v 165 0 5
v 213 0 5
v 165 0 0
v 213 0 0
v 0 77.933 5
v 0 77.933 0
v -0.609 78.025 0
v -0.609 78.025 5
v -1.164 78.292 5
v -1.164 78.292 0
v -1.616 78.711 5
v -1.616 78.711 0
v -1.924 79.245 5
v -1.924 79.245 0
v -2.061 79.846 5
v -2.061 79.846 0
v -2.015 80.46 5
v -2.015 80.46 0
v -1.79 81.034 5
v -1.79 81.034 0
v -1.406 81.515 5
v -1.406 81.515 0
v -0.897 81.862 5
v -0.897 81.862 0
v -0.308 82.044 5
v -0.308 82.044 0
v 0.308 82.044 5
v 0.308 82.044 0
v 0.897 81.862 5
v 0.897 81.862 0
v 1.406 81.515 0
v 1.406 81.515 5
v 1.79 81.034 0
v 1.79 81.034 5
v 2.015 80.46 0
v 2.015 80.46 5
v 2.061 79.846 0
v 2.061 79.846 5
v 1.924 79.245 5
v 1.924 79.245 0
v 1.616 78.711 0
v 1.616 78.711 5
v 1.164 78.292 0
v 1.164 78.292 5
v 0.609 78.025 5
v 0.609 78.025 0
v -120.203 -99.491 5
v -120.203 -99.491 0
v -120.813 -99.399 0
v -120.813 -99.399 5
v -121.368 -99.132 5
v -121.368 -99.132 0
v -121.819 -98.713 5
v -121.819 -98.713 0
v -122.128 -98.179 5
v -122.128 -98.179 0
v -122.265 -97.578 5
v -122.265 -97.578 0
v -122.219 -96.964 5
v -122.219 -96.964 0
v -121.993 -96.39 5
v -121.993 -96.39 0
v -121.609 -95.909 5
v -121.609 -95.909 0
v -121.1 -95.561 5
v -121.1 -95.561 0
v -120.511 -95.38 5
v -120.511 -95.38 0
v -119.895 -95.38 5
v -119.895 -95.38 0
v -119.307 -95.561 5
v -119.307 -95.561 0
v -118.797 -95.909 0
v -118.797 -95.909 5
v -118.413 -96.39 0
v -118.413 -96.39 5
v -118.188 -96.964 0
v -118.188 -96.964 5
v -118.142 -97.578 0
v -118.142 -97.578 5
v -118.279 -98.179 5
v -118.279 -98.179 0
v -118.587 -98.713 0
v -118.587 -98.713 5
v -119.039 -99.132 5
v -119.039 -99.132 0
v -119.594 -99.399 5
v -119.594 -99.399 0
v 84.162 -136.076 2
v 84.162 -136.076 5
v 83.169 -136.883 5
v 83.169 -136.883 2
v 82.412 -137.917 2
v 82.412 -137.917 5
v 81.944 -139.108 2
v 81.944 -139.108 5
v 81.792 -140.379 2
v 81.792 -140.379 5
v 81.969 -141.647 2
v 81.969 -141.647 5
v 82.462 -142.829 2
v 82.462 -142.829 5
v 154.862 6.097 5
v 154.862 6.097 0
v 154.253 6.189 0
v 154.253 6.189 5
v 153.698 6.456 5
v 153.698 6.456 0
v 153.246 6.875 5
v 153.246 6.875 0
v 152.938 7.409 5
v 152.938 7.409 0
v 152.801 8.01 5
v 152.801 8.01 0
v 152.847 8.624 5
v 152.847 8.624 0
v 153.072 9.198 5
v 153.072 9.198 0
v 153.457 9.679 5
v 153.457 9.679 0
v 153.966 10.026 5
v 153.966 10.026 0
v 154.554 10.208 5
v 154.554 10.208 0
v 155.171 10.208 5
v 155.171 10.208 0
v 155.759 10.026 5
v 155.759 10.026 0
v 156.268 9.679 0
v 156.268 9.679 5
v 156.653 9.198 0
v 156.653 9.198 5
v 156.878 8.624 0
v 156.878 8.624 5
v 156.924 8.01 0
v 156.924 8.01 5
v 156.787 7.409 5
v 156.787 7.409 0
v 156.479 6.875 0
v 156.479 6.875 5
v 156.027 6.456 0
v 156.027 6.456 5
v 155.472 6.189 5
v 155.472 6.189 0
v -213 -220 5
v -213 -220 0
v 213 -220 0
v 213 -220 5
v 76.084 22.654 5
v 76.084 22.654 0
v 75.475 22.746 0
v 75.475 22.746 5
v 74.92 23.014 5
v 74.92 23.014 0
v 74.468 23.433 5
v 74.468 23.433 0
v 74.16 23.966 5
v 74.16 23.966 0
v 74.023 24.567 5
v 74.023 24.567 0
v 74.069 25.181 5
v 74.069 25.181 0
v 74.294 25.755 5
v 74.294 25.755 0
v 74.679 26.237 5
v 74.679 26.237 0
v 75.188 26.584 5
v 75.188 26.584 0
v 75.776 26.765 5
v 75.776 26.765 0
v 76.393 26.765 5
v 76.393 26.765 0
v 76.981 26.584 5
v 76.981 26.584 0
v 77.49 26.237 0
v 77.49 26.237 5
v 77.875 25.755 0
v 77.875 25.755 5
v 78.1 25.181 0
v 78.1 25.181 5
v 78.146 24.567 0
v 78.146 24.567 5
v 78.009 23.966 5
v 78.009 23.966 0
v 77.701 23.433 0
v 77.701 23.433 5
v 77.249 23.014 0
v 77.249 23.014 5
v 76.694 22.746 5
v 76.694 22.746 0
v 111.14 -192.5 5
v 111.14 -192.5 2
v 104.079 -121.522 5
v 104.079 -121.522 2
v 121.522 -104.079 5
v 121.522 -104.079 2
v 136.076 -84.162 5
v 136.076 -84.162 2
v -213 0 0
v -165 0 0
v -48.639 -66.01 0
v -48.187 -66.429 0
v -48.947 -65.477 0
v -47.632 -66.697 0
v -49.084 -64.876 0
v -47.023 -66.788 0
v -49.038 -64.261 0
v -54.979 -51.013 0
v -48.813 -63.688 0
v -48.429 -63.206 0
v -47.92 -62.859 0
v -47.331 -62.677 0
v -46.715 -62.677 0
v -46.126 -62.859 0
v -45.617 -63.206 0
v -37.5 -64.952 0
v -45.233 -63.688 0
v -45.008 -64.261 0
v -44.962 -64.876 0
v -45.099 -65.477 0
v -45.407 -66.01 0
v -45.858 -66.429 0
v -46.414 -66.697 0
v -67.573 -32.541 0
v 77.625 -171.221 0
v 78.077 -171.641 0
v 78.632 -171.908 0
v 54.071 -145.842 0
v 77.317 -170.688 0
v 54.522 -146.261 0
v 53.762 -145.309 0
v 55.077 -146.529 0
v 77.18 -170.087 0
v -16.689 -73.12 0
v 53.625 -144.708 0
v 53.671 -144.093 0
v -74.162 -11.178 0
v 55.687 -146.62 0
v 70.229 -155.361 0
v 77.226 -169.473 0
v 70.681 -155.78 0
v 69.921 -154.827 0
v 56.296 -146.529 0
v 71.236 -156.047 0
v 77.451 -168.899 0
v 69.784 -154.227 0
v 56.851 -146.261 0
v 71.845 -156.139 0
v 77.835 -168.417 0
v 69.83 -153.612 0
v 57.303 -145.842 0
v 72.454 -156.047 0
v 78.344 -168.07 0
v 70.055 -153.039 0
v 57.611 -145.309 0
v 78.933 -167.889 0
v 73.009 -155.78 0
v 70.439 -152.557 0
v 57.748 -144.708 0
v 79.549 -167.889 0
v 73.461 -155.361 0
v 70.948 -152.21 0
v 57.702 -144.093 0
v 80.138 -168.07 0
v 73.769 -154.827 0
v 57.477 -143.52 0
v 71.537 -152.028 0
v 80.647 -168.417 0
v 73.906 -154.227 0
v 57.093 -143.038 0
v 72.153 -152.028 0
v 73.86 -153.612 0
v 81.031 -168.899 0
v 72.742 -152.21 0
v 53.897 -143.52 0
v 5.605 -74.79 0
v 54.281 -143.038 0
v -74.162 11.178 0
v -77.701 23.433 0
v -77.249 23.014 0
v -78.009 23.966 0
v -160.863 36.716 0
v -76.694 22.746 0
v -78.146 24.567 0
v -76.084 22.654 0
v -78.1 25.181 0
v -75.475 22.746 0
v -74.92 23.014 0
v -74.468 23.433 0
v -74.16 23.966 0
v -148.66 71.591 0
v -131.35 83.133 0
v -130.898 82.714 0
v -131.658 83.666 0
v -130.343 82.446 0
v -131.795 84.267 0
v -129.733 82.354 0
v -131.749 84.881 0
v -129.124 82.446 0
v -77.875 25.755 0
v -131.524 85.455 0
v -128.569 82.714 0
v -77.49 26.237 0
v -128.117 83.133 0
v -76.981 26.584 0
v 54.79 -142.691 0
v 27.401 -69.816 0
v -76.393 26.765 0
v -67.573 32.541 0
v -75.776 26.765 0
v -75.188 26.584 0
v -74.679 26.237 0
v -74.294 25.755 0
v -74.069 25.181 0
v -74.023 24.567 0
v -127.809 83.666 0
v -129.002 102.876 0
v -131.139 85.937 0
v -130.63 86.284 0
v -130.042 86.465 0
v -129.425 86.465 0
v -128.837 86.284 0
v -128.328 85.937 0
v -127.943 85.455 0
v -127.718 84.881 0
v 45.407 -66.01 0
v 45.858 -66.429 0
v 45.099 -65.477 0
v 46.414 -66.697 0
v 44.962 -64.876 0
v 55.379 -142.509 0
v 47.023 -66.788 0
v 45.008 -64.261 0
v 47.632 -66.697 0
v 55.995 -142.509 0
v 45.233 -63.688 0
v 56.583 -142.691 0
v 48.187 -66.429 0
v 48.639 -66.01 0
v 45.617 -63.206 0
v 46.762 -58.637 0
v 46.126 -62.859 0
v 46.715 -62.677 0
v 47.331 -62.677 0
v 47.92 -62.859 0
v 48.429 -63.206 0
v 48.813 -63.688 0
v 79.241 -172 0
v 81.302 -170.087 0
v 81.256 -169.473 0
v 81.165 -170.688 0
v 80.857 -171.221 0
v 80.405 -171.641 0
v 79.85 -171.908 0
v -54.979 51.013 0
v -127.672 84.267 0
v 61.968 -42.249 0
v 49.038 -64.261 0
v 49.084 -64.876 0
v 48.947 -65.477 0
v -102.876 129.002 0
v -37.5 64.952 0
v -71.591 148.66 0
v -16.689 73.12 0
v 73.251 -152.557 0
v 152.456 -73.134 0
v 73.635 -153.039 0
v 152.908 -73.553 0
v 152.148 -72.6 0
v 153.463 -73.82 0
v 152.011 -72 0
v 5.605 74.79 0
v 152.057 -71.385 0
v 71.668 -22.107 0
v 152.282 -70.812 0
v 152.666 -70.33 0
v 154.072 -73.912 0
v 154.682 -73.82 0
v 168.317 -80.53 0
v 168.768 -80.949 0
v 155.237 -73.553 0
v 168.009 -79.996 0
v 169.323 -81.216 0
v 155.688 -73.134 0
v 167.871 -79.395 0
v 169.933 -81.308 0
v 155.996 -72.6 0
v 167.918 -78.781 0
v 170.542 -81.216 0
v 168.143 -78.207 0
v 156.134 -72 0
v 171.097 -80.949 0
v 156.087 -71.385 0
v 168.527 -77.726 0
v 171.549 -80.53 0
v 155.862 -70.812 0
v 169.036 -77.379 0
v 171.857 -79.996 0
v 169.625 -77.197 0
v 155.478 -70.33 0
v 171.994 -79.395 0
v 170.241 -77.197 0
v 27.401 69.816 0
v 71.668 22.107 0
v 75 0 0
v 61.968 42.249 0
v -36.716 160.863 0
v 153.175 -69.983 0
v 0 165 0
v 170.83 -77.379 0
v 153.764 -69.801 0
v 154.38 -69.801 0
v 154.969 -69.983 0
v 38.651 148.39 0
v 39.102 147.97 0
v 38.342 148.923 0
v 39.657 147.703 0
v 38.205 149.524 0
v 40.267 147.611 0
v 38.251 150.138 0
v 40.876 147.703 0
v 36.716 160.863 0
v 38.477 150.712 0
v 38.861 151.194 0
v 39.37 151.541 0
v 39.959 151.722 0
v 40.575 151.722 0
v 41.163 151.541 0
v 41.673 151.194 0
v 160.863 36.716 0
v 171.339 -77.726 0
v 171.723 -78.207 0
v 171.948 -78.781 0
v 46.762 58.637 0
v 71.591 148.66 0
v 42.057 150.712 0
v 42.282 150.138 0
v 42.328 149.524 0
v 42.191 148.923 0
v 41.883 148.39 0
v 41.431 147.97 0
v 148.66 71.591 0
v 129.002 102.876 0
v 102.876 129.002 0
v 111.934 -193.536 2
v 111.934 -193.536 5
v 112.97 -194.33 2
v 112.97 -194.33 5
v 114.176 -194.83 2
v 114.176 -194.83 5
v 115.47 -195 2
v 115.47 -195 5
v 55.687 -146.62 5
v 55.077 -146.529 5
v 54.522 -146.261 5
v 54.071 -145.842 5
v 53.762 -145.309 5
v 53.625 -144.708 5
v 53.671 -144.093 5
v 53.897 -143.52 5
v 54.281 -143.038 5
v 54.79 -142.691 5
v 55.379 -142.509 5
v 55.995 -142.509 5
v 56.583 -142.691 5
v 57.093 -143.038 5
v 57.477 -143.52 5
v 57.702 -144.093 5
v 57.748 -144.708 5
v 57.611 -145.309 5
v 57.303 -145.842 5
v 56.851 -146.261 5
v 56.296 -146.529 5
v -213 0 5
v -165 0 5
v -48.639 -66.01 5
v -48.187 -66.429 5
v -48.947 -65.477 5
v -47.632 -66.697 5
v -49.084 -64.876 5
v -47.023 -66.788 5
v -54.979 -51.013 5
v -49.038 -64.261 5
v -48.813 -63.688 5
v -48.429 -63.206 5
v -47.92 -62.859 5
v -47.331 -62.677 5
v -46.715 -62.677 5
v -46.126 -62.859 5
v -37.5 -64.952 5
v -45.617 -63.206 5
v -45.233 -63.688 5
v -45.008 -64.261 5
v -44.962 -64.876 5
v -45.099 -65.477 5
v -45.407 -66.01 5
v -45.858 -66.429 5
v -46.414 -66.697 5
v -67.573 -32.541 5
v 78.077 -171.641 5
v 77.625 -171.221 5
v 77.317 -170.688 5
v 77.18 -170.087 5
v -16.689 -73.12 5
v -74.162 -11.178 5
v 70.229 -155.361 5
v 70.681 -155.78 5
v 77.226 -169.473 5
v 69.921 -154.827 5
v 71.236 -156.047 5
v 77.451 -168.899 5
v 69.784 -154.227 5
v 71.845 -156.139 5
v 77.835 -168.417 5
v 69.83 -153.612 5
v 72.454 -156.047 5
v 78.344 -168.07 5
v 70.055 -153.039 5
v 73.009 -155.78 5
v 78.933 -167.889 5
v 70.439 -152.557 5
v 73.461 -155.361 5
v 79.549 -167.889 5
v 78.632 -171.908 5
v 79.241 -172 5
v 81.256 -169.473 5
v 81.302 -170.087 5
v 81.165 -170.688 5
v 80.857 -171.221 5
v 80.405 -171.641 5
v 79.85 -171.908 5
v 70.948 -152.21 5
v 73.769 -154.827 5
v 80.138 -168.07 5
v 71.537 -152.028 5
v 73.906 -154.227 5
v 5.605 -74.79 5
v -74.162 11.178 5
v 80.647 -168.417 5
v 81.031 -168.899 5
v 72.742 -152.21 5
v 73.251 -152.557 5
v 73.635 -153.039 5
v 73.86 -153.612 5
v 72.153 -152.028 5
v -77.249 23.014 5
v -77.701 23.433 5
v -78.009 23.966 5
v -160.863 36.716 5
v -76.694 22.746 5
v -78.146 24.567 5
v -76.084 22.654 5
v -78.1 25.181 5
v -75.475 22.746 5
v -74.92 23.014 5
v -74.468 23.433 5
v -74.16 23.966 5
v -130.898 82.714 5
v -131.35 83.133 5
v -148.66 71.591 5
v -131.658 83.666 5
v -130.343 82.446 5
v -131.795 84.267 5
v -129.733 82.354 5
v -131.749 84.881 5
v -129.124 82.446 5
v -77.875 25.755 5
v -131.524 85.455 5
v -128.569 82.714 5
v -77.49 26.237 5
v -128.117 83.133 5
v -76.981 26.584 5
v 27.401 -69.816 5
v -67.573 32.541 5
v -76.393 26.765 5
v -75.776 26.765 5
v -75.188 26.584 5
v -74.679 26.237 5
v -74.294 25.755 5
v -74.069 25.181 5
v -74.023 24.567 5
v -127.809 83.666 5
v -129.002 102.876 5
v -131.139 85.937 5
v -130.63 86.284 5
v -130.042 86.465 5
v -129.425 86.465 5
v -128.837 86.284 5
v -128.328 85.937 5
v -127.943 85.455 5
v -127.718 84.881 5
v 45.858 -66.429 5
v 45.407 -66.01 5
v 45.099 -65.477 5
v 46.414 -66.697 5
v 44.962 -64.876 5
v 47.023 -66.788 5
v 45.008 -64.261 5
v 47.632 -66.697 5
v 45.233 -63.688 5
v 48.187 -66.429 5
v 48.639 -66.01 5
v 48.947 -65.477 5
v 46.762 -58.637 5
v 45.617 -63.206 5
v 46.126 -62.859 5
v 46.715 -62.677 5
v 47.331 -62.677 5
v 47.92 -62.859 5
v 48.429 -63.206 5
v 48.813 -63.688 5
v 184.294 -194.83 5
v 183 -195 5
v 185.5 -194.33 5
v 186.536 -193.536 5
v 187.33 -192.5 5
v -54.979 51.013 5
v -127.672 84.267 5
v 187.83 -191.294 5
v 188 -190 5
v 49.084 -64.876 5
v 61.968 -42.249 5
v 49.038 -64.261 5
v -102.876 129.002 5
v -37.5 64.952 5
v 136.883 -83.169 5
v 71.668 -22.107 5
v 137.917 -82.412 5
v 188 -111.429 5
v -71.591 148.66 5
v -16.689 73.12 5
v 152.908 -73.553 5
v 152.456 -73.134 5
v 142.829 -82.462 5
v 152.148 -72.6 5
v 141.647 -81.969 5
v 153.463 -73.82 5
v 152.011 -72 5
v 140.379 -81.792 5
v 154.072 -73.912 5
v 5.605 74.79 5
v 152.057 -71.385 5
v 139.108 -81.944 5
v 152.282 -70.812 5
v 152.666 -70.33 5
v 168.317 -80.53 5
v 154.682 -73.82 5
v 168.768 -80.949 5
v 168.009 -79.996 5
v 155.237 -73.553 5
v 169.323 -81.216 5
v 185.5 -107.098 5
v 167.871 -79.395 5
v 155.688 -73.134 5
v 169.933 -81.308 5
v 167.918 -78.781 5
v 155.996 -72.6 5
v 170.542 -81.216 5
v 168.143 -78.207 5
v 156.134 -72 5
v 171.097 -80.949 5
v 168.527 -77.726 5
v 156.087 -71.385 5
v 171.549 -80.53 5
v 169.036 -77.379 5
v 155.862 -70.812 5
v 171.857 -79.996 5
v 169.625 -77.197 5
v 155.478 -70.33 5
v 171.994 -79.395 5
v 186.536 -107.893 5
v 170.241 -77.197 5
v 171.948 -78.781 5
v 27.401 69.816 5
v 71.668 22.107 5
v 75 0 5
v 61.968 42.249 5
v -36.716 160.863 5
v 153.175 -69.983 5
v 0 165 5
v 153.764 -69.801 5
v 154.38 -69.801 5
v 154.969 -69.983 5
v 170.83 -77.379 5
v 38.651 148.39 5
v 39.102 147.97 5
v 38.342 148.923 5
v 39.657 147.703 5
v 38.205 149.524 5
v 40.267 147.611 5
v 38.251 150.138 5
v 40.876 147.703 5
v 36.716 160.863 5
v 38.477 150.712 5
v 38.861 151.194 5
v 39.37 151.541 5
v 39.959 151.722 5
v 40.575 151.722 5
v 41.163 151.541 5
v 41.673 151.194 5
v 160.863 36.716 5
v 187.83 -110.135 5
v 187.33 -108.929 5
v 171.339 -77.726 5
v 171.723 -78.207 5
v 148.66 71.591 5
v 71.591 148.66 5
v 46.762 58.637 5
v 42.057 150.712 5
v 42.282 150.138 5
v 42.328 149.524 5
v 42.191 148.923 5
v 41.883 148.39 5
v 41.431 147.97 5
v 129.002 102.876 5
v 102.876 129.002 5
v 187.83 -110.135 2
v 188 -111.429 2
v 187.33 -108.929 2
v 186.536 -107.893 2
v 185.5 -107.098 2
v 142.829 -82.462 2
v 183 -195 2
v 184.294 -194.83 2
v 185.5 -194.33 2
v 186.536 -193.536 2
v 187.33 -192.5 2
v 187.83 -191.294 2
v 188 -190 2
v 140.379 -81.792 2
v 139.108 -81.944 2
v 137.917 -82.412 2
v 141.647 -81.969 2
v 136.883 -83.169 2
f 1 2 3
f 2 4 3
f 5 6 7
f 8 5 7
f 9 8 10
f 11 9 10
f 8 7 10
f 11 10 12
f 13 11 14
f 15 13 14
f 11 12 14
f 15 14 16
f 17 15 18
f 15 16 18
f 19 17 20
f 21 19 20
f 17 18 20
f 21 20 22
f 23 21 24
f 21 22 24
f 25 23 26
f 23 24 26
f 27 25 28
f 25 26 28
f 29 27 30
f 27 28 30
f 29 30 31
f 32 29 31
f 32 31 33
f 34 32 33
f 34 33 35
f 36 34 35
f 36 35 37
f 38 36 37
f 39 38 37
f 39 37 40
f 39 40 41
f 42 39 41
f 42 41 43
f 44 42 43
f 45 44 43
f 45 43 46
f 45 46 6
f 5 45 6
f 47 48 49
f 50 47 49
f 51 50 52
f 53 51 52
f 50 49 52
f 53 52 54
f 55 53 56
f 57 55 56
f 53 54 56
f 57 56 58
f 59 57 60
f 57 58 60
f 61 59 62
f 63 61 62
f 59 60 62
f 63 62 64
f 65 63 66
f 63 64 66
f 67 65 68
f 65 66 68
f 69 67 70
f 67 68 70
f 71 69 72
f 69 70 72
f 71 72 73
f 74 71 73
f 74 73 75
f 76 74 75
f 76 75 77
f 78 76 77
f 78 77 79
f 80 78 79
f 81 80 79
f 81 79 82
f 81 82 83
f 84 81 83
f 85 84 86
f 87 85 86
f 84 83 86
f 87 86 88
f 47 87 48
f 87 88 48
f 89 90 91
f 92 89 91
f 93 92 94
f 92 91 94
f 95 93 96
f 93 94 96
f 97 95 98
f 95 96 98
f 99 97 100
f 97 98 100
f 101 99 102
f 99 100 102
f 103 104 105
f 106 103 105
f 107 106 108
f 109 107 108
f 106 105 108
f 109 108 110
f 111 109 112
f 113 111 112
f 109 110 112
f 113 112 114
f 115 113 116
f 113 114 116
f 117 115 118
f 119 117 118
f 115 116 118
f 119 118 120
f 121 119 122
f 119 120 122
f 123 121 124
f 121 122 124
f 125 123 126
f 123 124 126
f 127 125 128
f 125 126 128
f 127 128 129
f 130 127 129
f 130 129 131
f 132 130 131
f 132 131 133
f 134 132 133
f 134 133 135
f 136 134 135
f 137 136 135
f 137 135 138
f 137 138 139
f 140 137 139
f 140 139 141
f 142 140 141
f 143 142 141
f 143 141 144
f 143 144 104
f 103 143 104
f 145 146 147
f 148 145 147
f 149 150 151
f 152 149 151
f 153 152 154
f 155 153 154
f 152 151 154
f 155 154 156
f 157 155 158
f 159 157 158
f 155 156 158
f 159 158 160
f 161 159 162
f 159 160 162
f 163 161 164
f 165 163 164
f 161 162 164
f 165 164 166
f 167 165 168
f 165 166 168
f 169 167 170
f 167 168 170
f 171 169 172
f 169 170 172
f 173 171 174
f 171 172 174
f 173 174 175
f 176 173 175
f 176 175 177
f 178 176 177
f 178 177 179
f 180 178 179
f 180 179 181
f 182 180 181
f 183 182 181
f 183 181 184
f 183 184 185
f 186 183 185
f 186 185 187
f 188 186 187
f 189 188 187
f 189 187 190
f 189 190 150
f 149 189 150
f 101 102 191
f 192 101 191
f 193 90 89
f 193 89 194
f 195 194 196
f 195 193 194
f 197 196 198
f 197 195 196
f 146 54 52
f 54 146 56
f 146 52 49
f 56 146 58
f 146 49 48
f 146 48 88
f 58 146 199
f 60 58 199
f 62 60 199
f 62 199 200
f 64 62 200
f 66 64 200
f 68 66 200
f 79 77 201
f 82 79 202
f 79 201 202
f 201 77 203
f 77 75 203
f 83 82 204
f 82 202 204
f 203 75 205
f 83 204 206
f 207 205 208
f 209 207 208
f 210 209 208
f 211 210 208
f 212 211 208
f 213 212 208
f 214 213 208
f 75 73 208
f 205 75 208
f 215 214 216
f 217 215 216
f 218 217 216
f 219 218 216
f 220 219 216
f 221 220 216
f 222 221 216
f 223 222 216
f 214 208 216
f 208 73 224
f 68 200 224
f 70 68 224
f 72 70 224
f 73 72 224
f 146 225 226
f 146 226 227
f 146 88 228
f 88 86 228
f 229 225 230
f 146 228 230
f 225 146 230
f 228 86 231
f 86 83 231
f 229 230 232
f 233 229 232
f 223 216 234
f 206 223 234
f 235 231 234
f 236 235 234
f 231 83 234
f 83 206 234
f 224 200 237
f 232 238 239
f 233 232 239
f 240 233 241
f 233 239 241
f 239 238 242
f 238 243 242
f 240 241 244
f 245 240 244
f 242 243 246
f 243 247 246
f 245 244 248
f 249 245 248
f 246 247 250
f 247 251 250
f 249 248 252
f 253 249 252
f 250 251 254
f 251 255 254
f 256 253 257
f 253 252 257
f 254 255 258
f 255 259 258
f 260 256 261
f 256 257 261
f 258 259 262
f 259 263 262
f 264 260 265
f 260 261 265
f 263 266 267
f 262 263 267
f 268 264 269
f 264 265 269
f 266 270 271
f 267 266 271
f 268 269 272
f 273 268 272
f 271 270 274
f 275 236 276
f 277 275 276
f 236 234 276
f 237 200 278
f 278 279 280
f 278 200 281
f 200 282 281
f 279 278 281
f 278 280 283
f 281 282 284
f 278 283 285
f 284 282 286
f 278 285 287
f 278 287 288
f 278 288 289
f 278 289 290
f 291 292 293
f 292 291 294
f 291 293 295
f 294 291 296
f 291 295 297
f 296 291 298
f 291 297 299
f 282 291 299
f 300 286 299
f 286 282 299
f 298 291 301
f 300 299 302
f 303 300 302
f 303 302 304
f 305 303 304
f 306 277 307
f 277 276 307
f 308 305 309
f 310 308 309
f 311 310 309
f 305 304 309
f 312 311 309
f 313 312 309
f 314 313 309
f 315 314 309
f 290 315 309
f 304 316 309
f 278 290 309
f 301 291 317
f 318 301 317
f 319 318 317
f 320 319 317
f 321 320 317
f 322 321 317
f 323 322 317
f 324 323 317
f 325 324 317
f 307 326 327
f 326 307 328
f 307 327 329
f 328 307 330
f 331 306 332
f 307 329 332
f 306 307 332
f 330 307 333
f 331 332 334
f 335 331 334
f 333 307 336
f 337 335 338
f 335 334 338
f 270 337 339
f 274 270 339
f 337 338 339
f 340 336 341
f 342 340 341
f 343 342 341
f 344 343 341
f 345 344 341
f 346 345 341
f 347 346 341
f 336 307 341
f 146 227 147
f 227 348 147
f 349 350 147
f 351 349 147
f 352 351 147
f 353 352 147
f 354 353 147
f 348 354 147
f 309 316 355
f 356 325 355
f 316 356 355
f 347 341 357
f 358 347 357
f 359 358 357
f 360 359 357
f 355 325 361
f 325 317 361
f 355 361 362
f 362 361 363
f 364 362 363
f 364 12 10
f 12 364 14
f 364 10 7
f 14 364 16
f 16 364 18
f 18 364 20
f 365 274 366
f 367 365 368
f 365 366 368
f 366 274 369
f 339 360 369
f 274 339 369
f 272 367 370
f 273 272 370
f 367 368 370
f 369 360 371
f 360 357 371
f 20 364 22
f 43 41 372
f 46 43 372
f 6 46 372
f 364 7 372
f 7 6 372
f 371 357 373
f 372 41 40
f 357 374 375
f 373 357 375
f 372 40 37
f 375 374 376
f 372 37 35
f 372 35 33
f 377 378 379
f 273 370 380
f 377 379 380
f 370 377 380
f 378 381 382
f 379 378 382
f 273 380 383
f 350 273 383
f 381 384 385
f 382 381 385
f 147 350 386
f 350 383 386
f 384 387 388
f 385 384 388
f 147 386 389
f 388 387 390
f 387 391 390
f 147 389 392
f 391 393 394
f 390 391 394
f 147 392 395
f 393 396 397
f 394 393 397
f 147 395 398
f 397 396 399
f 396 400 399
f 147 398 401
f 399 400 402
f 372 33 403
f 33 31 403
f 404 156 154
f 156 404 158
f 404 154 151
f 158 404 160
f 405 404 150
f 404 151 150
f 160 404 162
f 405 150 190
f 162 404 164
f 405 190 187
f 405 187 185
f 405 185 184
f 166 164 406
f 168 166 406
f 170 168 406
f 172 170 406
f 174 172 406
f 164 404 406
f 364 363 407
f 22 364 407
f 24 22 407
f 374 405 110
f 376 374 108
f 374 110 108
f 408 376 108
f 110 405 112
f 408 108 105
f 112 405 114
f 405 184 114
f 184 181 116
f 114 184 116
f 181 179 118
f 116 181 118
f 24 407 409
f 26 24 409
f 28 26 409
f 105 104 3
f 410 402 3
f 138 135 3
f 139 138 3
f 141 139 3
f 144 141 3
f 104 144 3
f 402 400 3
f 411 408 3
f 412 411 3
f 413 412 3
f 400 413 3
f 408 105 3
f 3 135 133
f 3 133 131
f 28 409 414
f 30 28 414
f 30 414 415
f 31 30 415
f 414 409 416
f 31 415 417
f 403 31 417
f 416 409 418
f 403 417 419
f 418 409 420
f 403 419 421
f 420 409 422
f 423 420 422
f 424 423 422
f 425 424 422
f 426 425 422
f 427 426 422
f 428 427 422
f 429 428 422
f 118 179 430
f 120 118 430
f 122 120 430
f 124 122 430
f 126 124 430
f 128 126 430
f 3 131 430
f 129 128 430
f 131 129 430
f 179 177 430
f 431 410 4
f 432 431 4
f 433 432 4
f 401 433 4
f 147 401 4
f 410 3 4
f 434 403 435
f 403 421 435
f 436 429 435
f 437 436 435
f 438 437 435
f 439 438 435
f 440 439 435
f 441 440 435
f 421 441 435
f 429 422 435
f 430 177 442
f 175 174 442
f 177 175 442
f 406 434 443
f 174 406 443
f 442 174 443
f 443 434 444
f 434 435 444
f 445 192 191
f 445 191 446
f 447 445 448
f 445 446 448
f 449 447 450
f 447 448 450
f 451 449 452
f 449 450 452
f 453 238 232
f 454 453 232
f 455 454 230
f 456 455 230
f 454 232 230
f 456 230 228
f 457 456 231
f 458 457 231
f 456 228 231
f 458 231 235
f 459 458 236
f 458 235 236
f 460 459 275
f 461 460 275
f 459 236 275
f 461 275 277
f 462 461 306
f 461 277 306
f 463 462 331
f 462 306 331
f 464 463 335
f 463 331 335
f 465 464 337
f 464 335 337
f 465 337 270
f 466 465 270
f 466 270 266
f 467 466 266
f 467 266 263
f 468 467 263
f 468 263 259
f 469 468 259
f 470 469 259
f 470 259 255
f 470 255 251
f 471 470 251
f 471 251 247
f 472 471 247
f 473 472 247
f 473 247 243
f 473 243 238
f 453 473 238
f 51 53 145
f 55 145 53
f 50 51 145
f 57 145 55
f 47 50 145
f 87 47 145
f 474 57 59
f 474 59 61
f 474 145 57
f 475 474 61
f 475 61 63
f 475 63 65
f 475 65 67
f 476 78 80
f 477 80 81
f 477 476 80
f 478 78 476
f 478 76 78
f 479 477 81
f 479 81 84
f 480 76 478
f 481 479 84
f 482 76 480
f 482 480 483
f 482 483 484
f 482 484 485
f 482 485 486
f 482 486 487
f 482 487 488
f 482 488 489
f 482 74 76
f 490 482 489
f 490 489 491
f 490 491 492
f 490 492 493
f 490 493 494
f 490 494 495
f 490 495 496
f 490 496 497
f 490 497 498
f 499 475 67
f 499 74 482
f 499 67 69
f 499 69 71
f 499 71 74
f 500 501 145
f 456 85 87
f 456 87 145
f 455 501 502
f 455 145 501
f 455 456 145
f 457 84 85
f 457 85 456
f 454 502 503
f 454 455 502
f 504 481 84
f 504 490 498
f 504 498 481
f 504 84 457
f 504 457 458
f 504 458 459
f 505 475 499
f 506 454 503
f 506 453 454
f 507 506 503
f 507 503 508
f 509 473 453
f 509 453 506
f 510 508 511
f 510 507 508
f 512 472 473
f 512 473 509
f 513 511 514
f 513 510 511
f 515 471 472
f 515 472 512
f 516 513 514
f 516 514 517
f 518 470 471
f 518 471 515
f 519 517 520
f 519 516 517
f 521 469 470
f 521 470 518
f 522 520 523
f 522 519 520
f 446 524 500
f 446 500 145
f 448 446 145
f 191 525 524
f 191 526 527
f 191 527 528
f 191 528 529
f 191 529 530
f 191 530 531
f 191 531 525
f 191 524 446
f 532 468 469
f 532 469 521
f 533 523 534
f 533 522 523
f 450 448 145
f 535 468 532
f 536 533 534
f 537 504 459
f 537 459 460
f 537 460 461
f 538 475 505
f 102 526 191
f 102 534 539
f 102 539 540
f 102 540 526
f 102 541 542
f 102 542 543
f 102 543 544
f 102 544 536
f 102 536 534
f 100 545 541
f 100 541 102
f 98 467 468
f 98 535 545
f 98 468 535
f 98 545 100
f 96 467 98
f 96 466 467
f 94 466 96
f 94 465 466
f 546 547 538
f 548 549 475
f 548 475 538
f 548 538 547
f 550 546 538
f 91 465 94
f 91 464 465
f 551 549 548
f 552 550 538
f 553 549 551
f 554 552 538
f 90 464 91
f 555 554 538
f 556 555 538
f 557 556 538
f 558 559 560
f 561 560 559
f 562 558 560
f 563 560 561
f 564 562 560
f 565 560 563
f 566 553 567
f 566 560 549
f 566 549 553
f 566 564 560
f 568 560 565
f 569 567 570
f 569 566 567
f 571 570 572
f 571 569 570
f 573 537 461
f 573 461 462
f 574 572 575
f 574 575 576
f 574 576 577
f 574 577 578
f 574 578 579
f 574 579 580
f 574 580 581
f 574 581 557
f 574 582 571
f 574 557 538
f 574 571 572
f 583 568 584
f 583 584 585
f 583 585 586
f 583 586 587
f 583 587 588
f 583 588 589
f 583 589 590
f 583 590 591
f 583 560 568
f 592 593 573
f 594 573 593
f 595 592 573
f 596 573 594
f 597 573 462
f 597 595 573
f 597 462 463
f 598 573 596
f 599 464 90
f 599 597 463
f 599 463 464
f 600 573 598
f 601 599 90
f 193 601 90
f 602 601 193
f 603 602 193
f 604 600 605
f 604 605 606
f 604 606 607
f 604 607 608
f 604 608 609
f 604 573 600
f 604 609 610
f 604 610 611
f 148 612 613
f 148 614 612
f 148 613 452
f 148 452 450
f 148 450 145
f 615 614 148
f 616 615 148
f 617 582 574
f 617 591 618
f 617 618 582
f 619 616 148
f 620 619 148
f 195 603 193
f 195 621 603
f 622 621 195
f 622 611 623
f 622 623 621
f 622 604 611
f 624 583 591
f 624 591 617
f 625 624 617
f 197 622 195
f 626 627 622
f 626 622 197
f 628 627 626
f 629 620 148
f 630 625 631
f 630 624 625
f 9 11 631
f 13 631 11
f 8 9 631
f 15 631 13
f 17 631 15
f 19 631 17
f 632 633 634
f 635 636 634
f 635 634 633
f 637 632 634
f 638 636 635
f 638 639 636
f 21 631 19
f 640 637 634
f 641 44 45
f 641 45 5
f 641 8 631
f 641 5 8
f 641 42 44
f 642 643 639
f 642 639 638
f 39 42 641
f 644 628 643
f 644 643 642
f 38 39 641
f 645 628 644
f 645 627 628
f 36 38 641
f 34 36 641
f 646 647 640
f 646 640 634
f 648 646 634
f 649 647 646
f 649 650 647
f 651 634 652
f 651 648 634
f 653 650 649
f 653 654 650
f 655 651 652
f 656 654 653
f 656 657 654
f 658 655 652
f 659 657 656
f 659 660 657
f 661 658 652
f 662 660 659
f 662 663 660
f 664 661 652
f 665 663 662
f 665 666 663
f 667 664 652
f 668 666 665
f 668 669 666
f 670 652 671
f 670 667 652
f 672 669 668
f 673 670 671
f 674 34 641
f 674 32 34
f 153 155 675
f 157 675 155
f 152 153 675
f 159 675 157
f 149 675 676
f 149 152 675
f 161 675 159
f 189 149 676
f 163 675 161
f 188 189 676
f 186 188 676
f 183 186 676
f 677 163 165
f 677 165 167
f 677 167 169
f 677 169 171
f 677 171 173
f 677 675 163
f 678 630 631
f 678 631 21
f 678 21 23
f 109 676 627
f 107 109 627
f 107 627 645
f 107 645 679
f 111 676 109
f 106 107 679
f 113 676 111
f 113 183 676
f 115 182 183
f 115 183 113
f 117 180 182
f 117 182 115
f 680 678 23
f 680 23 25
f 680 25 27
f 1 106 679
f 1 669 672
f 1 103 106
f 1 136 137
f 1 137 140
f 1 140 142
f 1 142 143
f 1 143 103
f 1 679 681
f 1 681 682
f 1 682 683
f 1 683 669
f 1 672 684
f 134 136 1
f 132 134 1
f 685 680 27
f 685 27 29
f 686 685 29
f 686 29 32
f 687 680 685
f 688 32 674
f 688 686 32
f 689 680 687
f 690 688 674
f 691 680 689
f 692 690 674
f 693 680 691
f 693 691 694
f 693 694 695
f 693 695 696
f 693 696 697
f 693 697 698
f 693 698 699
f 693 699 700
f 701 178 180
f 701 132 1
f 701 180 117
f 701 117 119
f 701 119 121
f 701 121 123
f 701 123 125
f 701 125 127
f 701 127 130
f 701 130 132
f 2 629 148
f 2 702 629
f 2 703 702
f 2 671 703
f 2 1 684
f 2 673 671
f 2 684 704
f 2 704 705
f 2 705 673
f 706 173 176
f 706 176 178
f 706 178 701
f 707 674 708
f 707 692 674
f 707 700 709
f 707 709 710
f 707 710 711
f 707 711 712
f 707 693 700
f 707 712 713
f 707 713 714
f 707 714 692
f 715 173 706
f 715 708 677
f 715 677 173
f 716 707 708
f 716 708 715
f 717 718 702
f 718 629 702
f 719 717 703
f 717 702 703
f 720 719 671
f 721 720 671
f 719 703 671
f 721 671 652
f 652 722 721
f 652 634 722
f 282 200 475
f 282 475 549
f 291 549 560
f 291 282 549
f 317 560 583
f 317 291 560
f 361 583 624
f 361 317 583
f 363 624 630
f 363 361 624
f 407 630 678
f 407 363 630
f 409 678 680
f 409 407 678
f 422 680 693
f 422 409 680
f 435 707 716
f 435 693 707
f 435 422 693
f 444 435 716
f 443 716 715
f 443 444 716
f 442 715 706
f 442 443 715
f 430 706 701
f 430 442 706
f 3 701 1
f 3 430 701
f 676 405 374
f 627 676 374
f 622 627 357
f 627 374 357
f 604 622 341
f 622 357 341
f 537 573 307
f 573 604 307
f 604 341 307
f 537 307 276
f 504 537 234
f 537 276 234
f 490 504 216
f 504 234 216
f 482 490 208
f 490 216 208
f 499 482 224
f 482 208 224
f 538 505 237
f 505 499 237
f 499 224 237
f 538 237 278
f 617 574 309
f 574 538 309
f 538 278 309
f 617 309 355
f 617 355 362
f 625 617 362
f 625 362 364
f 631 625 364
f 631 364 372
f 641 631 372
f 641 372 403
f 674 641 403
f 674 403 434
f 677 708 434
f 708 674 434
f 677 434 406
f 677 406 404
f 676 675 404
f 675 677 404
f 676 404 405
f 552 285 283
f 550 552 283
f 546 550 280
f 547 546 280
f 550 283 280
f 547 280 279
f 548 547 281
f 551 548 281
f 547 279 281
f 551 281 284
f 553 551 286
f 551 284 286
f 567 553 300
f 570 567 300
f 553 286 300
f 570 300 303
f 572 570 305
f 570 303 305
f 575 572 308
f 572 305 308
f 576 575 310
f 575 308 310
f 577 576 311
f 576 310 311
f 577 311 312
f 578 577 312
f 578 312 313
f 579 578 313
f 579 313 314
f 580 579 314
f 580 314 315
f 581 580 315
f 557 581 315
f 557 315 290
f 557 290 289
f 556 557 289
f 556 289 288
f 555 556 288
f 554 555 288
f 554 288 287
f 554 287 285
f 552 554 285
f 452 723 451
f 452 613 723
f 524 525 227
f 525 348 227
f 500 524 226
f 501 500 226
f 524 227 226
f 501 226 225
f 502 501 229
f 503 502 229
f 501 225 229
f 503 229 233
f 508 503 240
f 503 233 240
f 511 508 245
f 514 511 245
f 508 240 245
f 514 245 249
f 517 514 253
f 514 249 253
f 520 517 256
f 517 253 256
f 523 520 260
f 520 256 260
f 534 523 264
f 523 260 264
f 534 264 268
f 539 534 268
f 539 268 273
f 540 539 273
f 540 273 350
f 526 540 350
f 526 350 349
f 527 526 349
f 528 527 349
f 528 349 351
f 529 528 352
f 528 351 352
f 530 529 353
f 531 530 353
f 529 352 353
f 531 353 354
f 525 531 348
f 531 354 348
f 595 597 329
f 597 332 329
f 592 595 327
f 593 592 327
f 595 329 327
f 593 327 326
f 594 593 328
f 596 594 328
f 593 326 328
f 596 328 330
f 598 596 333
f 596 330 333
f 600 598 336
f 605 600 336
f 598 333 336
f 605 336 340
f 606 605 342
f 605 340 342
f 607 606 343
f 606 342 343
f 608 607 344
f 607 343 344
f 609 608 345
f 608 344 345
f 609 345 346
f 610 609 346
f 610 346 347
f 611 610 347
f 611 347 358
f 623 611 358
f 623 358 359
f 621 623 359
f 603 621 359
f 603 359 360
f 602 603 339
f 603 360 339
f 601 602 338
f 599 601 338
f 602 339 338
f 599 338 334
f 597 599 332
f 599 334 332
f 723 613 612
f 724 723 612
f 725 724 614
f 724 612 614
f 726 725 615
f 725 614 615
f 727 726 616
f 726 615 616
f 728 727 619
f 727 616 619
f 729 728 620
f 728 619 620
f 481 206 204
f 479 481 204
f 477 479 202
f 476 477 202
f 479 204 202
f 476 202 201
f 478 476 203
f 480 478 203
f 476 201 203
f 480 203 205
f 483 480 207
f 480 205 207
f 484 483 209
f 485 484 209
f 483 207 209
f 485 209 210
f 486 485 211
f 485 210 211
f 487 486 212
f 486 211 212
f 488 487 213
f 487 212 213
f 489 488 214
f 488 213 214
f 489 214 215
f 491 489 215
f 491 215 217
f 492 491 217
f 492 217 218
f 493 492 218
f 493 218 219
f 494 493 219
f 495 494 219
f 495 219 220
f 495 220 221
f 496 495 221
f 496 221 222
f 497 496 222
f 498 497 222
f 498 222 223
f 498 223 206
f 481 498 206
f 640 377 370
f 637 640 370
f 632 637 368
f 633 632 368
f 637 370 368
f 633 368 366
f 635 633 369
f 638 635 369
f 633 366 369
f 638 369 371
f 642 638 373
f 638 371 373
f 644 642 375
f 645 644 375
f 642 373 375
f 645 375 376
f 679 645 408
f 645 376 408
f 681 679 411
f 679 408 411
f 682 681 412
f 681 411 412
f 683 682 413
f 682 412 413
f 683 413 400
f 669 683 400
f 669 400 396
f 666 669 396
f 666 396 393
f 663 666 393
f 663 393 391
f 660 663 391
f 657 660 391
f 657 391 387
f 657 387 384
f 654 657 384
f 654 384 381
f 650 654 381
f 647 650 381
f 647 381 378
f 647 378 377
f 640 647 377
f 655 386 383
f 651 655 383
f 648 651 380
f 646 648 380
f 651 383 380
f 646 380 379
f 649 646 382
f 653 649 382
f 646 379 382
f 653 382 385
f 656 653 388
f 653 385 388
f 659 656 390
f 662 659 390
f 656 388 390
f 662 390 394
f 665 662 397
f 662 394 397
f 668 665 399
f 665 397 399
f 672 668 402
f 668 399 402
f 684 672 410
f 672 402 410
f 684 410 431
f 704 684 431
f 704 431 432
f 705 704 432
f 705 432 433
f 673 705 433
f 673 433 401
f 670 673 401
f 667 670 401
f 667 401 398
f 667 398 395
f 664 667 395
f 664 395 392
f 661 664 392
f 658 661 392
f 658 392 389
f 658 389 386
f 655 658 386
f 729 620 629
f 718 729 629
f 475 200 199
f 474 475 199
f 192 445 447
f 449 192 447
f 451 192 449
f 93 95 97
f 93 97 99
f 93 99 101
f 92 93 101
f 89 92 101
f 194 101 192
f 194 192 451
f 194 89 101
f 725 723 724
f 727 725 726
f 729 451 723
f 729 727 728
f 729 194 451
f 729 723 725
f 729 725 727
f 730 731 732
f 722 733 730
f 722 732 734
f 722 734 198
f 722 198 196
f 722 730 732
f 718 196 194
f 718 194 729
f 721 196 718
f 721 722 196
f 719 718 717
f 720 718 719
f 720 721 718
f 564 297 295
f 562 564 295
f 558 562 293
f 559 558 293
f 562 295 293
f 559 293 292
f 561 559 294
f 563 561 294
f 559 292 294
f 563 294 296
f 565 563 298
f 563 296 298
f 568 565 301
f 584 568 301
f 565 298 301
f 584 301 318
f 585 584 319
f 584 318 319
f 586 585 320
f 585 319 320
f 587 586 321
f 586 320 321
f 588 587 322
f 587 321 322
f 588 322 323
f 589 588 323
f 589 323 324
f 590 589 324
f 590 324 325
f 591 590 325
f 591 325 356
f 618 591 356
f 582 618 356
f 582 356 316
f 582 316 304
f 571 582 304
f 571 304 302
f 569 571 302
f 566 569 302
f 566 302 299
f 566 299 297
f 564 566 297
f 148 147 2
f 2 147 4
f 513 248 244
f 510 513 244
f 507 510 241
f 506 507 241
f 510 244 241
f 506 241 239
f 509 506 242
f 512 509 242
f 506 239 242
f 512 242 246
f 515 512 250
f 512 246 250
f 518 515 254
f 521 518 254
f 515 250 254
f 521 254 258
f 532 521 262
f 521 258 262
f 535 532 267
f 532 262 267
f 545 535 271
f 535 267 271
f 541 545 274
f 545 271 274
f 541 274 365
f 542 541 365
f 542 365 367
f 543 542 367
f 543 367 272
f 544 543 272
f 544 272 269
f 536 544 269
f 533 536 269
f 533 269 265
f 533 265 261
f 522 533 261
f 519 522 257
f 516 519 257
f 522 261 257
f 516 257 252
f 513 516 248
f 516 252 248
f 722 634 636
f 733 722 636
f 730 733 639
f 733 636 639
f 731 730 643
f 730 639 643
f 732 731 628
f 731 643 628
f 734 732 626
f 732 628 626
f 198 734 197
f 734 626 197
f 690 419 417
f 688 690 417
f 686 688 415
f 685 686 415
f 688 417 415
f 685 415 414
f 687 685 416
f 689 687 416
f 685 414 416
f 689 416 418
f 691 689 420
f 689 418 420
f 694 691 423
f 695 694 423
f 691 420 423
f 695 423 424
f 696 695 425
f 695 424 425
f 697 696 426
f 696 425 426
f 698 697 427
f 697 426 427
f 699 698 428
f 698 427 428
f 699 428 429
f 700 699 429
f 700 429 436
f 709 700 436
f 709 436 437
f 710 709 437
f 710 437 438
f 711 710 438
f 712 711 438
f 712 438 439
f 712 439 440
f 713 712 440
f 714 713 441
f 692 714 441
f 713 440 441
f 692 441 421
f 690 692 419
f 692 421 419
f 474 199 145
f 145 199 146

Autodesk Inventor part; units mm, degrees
ref_plane "YZ Plane" through (0, 0, 0) normal (1, 0, 0) x (0, 1, 0)
ref_plane "XZ Plane" through (0, 0, 0) normal (0, 1, 0) x (-1, 0, 0)
ref_plane "XY Plane" through (0, 0, 0) normal (0, 0, 1) x (1, 0, 0)
sketch "Sketch1" plane through (0, 0, 0) normal (0, 0, 1) x (1, 0, 0)
  circle A0 centre (0, 0) radius 75
  circle A1 centre (0, 0) radius 160
  arc A2 (165, 0) -> (-165, 0) centre (0, 0) ccw
  line L0 (-213, 0) -> (-213, -220)
  line L1 (-213, -220) -> (213, -220)
  line L2 (213, -220) -> (213, 0)
  line L3 (213, 0) -> (165, 0)
  line L4 (-165, 0) -> (-213, 0)
  dimension "inner_diameter" = 150
  dimension "outer_diameter" = 320
  dimension "d37" = 330
  dimension "d38" = 426
  dimension "d39" = 220
  dimension "d40" = 213
  dimension "d41" = 220
extrude "Extrusion1" add sketch "Sketch1" along normal blind 5 contours A1 | L3 L2 L1 L0 L4 A2
sketch "Sketch2" plane through (0, 0, 5) normal (0, 0, 1) x (1, 0, 0)
  circle A0 centre (0, 0) radius 155 construction
  line L0 (0.1758, 0.0573) -> (40.2666, 149.6783) construction
  line L1 (0.1758, 0.0573) -> (-129.7335, 84.4214) construction
  line L2 (0.1758, 0.0573) -> (-120.2034, -97.4238) construction
  line L3 (0.1758, 0.0573) -> (55.6866, -144.5534) construction
  line L4 (0.1758, 0.0573) -> (154.8625, 8.1641) construction
  line L5 (0.1758, 0.0573) -> (0.1758, 154.9999) construction
  dimension "d4" = 310
  dimension "d30" = 360
  dimension "d36" = 15
hole "Hole1" at (40.2666, 149.6783, 5) at (-129.7335, 84.4214, 5) at (-120.2034, -97.4238, 5) at (55.6866, -144.5534, 5) at (154.8625, 8.1641, 5) direction (0, 0, -1) diameter 4.134 depth 8 tip angle 118 thread size "M5x0.8" class "6H" standard "ANSI Metric M Profile"
sketch "Sketch3" plane through (0, 0, 5) normal (0, 0, 1) x (1, 0, 0)
  circle A0 centre (0, 0) radius 80 construction
  line L0 (0, 0) -> (0, 80) construction
  point P0 (-76.0845, 24.7214)
  point P1 (-76.0845, 24.7214)
  point P2 (-47.0228, -64.7214)
  point P3 (-47.0228, -64.7214)
  point P4 (47.0228, -64.7214)
  point P5 (47.0228, -64.7214)
  point P6 (76.0845, 24.7214)
  point P7 (76.0845, 24.7214)
  dimension "inner_holes_diameter" = 160
  dimension "d34" = 360
hole "Hole2" at (0, 80, 5) at (76.0845, 24.7214, 5) at (47.0228, -64.7214, 5) at (-47.0228, -64.7214, 5) at (-76.0845, 24.7214, 5) direction (0, 0, -1) diameter 4.134 depth 8 tip angle 118 thread size "M5x0.8" class "6H" standard "ANSI Metric M Profile"
sketch "Sketch5" plane through (0, 0, 5) normal (0, 0, 1) x (1, 0, 0)
  arc A0 (0, -160) -> (80, -138.5641) centre (0, 0) ccw construction
  line L0 (0, 0) -> (0, -160) construction
  line L1 (0, 0) -> (138.5641, -80) construction
  line L2 (0, 0) -> (80, -138.5641) construction
  arc A1 (138.5641, -80) -> (0, -160) centre (0, 0) ccw construction
  arc A2 (84.1622, -136.0762) -> (136.0762, -84.1622) centre (0, 0) ccw
  line L3 (82.4621, -142.8286) -> (111.1399, -192.5)
  line L4 (142.8286, -82.4621) -> (185.5, -107.0985)
  arc A3 (142.8286, -82.4621) -> (136.0762, -84.1622) centre (140.3286, -86.7922) ccw
  arc A4 (84.1622, -136.0762) -> (82.4621, -142.8286) centre (86.7922, -140.3286) ccw
  line L5 (188, -190) -> (188, -111.4286)
  line L6 (183, -195) -> (115.4701, -195)
  arc A5 (111.1399, -192.5) -> (115.4701, -195) centre (115.4701, -190) ccw
  arc A6 (188, -111.4286) -> (185.5, -107.0985) centre (183, -111.4286) ccw
  arc A7 (183, -195) -> (188, -190) centre (183, -190) ccw
  line L7 (213, -220) -> (213, 0) projected
  line L8 (-213, -220) -> (213, -220) projected
  point P0 (188, -108.5419)
  point P1 (112.5833, -195)
  point P2 (188, -195)
  dimension "d50" = 320
  dimension "d52" = 30
  dimension "d53" = 30
  dimension "d54" = 5
  dimension "d68" = 5
  dimension "d69" = 5
  dimension "d70" = 25
  dimension "d71" = 25
extrude "Extrusion3" cut sketch "Sketch5" against normal blind 3
sketch "Sketch6" plane through (0, 0, 5) normal (0, 0, 1) x (1, 0, 0)
  arc A0 (142.8286, -82.4621) -> (136.0762, -84.1622) centre (140.3286, -86.7922) ccw projected
  arc A1 (84.1622, -136.0762) -> (136.0762, -84.1622) centre (0, 0) ccw projected
  arc A2 (84.1622, -136.0762) -> (82.4621, -142.8286) centre (86.7922, -140.3286) ccw projected
  line L0 (111.1399, -192.5) -> (82.4621, -142.8286) projected
  line L1 (142.8286, -82.4621) -> (185.5, -107.0985) projected
  circle A3 centre (0, 0) radius 170 construction
  circle A4 centre (0, 0) radius 187.5 construction
  line L2 (0, 0) -> (0, -170) construction
  line L3 (0, 0) -> (79.2409, -169.9327) construction
  line L4 (0, 0) -> (169.9327, -79.2409) construction
  line L5 (183, -195) -> (115.4701, -195) projected
  line L6 (188, -111.4286) -> (188, -190) projected
  arc A5 (111.1399, -192.5) -> (115.4701, -195) centre (115.4701, -190) ccw projected
  arc A6 (183, -195) -> (188, -190) centre (183, -190) ccw projected
  arc A7 (188, -111.4286) -> (185.5, -107.0985) centre (183, -111.4286) ccw projected
  point P0 (71.8451, -154.0723)
  point P1 (154.0723, -71.8451)
  dimension "d57" = 340
  dimension "d58" = 375
  dimension "d59" = 25
  dimension "d60" = 40
hole "Hole3" at (71.8451, -154.0723, 5) at (79.2409, -169.9327, 5) at (169.9327, -79.2409, 5) at (154.0723, -71.8451, 5) direction (0, 0, -1) diameter 4.134 end through all thread size "M5x0.8" class "6H" standard "ANSI Metric M Profile"
equation "\"inner_diameter\" = id"
equation "\"outer_diameter\" = od"
equation "\"d40\" = 0.5 * d38"
equation "\"d50\" = od"
equation "\"id\" = 150"
equation "\"od\" = 320"
properties part number "bakplate"
